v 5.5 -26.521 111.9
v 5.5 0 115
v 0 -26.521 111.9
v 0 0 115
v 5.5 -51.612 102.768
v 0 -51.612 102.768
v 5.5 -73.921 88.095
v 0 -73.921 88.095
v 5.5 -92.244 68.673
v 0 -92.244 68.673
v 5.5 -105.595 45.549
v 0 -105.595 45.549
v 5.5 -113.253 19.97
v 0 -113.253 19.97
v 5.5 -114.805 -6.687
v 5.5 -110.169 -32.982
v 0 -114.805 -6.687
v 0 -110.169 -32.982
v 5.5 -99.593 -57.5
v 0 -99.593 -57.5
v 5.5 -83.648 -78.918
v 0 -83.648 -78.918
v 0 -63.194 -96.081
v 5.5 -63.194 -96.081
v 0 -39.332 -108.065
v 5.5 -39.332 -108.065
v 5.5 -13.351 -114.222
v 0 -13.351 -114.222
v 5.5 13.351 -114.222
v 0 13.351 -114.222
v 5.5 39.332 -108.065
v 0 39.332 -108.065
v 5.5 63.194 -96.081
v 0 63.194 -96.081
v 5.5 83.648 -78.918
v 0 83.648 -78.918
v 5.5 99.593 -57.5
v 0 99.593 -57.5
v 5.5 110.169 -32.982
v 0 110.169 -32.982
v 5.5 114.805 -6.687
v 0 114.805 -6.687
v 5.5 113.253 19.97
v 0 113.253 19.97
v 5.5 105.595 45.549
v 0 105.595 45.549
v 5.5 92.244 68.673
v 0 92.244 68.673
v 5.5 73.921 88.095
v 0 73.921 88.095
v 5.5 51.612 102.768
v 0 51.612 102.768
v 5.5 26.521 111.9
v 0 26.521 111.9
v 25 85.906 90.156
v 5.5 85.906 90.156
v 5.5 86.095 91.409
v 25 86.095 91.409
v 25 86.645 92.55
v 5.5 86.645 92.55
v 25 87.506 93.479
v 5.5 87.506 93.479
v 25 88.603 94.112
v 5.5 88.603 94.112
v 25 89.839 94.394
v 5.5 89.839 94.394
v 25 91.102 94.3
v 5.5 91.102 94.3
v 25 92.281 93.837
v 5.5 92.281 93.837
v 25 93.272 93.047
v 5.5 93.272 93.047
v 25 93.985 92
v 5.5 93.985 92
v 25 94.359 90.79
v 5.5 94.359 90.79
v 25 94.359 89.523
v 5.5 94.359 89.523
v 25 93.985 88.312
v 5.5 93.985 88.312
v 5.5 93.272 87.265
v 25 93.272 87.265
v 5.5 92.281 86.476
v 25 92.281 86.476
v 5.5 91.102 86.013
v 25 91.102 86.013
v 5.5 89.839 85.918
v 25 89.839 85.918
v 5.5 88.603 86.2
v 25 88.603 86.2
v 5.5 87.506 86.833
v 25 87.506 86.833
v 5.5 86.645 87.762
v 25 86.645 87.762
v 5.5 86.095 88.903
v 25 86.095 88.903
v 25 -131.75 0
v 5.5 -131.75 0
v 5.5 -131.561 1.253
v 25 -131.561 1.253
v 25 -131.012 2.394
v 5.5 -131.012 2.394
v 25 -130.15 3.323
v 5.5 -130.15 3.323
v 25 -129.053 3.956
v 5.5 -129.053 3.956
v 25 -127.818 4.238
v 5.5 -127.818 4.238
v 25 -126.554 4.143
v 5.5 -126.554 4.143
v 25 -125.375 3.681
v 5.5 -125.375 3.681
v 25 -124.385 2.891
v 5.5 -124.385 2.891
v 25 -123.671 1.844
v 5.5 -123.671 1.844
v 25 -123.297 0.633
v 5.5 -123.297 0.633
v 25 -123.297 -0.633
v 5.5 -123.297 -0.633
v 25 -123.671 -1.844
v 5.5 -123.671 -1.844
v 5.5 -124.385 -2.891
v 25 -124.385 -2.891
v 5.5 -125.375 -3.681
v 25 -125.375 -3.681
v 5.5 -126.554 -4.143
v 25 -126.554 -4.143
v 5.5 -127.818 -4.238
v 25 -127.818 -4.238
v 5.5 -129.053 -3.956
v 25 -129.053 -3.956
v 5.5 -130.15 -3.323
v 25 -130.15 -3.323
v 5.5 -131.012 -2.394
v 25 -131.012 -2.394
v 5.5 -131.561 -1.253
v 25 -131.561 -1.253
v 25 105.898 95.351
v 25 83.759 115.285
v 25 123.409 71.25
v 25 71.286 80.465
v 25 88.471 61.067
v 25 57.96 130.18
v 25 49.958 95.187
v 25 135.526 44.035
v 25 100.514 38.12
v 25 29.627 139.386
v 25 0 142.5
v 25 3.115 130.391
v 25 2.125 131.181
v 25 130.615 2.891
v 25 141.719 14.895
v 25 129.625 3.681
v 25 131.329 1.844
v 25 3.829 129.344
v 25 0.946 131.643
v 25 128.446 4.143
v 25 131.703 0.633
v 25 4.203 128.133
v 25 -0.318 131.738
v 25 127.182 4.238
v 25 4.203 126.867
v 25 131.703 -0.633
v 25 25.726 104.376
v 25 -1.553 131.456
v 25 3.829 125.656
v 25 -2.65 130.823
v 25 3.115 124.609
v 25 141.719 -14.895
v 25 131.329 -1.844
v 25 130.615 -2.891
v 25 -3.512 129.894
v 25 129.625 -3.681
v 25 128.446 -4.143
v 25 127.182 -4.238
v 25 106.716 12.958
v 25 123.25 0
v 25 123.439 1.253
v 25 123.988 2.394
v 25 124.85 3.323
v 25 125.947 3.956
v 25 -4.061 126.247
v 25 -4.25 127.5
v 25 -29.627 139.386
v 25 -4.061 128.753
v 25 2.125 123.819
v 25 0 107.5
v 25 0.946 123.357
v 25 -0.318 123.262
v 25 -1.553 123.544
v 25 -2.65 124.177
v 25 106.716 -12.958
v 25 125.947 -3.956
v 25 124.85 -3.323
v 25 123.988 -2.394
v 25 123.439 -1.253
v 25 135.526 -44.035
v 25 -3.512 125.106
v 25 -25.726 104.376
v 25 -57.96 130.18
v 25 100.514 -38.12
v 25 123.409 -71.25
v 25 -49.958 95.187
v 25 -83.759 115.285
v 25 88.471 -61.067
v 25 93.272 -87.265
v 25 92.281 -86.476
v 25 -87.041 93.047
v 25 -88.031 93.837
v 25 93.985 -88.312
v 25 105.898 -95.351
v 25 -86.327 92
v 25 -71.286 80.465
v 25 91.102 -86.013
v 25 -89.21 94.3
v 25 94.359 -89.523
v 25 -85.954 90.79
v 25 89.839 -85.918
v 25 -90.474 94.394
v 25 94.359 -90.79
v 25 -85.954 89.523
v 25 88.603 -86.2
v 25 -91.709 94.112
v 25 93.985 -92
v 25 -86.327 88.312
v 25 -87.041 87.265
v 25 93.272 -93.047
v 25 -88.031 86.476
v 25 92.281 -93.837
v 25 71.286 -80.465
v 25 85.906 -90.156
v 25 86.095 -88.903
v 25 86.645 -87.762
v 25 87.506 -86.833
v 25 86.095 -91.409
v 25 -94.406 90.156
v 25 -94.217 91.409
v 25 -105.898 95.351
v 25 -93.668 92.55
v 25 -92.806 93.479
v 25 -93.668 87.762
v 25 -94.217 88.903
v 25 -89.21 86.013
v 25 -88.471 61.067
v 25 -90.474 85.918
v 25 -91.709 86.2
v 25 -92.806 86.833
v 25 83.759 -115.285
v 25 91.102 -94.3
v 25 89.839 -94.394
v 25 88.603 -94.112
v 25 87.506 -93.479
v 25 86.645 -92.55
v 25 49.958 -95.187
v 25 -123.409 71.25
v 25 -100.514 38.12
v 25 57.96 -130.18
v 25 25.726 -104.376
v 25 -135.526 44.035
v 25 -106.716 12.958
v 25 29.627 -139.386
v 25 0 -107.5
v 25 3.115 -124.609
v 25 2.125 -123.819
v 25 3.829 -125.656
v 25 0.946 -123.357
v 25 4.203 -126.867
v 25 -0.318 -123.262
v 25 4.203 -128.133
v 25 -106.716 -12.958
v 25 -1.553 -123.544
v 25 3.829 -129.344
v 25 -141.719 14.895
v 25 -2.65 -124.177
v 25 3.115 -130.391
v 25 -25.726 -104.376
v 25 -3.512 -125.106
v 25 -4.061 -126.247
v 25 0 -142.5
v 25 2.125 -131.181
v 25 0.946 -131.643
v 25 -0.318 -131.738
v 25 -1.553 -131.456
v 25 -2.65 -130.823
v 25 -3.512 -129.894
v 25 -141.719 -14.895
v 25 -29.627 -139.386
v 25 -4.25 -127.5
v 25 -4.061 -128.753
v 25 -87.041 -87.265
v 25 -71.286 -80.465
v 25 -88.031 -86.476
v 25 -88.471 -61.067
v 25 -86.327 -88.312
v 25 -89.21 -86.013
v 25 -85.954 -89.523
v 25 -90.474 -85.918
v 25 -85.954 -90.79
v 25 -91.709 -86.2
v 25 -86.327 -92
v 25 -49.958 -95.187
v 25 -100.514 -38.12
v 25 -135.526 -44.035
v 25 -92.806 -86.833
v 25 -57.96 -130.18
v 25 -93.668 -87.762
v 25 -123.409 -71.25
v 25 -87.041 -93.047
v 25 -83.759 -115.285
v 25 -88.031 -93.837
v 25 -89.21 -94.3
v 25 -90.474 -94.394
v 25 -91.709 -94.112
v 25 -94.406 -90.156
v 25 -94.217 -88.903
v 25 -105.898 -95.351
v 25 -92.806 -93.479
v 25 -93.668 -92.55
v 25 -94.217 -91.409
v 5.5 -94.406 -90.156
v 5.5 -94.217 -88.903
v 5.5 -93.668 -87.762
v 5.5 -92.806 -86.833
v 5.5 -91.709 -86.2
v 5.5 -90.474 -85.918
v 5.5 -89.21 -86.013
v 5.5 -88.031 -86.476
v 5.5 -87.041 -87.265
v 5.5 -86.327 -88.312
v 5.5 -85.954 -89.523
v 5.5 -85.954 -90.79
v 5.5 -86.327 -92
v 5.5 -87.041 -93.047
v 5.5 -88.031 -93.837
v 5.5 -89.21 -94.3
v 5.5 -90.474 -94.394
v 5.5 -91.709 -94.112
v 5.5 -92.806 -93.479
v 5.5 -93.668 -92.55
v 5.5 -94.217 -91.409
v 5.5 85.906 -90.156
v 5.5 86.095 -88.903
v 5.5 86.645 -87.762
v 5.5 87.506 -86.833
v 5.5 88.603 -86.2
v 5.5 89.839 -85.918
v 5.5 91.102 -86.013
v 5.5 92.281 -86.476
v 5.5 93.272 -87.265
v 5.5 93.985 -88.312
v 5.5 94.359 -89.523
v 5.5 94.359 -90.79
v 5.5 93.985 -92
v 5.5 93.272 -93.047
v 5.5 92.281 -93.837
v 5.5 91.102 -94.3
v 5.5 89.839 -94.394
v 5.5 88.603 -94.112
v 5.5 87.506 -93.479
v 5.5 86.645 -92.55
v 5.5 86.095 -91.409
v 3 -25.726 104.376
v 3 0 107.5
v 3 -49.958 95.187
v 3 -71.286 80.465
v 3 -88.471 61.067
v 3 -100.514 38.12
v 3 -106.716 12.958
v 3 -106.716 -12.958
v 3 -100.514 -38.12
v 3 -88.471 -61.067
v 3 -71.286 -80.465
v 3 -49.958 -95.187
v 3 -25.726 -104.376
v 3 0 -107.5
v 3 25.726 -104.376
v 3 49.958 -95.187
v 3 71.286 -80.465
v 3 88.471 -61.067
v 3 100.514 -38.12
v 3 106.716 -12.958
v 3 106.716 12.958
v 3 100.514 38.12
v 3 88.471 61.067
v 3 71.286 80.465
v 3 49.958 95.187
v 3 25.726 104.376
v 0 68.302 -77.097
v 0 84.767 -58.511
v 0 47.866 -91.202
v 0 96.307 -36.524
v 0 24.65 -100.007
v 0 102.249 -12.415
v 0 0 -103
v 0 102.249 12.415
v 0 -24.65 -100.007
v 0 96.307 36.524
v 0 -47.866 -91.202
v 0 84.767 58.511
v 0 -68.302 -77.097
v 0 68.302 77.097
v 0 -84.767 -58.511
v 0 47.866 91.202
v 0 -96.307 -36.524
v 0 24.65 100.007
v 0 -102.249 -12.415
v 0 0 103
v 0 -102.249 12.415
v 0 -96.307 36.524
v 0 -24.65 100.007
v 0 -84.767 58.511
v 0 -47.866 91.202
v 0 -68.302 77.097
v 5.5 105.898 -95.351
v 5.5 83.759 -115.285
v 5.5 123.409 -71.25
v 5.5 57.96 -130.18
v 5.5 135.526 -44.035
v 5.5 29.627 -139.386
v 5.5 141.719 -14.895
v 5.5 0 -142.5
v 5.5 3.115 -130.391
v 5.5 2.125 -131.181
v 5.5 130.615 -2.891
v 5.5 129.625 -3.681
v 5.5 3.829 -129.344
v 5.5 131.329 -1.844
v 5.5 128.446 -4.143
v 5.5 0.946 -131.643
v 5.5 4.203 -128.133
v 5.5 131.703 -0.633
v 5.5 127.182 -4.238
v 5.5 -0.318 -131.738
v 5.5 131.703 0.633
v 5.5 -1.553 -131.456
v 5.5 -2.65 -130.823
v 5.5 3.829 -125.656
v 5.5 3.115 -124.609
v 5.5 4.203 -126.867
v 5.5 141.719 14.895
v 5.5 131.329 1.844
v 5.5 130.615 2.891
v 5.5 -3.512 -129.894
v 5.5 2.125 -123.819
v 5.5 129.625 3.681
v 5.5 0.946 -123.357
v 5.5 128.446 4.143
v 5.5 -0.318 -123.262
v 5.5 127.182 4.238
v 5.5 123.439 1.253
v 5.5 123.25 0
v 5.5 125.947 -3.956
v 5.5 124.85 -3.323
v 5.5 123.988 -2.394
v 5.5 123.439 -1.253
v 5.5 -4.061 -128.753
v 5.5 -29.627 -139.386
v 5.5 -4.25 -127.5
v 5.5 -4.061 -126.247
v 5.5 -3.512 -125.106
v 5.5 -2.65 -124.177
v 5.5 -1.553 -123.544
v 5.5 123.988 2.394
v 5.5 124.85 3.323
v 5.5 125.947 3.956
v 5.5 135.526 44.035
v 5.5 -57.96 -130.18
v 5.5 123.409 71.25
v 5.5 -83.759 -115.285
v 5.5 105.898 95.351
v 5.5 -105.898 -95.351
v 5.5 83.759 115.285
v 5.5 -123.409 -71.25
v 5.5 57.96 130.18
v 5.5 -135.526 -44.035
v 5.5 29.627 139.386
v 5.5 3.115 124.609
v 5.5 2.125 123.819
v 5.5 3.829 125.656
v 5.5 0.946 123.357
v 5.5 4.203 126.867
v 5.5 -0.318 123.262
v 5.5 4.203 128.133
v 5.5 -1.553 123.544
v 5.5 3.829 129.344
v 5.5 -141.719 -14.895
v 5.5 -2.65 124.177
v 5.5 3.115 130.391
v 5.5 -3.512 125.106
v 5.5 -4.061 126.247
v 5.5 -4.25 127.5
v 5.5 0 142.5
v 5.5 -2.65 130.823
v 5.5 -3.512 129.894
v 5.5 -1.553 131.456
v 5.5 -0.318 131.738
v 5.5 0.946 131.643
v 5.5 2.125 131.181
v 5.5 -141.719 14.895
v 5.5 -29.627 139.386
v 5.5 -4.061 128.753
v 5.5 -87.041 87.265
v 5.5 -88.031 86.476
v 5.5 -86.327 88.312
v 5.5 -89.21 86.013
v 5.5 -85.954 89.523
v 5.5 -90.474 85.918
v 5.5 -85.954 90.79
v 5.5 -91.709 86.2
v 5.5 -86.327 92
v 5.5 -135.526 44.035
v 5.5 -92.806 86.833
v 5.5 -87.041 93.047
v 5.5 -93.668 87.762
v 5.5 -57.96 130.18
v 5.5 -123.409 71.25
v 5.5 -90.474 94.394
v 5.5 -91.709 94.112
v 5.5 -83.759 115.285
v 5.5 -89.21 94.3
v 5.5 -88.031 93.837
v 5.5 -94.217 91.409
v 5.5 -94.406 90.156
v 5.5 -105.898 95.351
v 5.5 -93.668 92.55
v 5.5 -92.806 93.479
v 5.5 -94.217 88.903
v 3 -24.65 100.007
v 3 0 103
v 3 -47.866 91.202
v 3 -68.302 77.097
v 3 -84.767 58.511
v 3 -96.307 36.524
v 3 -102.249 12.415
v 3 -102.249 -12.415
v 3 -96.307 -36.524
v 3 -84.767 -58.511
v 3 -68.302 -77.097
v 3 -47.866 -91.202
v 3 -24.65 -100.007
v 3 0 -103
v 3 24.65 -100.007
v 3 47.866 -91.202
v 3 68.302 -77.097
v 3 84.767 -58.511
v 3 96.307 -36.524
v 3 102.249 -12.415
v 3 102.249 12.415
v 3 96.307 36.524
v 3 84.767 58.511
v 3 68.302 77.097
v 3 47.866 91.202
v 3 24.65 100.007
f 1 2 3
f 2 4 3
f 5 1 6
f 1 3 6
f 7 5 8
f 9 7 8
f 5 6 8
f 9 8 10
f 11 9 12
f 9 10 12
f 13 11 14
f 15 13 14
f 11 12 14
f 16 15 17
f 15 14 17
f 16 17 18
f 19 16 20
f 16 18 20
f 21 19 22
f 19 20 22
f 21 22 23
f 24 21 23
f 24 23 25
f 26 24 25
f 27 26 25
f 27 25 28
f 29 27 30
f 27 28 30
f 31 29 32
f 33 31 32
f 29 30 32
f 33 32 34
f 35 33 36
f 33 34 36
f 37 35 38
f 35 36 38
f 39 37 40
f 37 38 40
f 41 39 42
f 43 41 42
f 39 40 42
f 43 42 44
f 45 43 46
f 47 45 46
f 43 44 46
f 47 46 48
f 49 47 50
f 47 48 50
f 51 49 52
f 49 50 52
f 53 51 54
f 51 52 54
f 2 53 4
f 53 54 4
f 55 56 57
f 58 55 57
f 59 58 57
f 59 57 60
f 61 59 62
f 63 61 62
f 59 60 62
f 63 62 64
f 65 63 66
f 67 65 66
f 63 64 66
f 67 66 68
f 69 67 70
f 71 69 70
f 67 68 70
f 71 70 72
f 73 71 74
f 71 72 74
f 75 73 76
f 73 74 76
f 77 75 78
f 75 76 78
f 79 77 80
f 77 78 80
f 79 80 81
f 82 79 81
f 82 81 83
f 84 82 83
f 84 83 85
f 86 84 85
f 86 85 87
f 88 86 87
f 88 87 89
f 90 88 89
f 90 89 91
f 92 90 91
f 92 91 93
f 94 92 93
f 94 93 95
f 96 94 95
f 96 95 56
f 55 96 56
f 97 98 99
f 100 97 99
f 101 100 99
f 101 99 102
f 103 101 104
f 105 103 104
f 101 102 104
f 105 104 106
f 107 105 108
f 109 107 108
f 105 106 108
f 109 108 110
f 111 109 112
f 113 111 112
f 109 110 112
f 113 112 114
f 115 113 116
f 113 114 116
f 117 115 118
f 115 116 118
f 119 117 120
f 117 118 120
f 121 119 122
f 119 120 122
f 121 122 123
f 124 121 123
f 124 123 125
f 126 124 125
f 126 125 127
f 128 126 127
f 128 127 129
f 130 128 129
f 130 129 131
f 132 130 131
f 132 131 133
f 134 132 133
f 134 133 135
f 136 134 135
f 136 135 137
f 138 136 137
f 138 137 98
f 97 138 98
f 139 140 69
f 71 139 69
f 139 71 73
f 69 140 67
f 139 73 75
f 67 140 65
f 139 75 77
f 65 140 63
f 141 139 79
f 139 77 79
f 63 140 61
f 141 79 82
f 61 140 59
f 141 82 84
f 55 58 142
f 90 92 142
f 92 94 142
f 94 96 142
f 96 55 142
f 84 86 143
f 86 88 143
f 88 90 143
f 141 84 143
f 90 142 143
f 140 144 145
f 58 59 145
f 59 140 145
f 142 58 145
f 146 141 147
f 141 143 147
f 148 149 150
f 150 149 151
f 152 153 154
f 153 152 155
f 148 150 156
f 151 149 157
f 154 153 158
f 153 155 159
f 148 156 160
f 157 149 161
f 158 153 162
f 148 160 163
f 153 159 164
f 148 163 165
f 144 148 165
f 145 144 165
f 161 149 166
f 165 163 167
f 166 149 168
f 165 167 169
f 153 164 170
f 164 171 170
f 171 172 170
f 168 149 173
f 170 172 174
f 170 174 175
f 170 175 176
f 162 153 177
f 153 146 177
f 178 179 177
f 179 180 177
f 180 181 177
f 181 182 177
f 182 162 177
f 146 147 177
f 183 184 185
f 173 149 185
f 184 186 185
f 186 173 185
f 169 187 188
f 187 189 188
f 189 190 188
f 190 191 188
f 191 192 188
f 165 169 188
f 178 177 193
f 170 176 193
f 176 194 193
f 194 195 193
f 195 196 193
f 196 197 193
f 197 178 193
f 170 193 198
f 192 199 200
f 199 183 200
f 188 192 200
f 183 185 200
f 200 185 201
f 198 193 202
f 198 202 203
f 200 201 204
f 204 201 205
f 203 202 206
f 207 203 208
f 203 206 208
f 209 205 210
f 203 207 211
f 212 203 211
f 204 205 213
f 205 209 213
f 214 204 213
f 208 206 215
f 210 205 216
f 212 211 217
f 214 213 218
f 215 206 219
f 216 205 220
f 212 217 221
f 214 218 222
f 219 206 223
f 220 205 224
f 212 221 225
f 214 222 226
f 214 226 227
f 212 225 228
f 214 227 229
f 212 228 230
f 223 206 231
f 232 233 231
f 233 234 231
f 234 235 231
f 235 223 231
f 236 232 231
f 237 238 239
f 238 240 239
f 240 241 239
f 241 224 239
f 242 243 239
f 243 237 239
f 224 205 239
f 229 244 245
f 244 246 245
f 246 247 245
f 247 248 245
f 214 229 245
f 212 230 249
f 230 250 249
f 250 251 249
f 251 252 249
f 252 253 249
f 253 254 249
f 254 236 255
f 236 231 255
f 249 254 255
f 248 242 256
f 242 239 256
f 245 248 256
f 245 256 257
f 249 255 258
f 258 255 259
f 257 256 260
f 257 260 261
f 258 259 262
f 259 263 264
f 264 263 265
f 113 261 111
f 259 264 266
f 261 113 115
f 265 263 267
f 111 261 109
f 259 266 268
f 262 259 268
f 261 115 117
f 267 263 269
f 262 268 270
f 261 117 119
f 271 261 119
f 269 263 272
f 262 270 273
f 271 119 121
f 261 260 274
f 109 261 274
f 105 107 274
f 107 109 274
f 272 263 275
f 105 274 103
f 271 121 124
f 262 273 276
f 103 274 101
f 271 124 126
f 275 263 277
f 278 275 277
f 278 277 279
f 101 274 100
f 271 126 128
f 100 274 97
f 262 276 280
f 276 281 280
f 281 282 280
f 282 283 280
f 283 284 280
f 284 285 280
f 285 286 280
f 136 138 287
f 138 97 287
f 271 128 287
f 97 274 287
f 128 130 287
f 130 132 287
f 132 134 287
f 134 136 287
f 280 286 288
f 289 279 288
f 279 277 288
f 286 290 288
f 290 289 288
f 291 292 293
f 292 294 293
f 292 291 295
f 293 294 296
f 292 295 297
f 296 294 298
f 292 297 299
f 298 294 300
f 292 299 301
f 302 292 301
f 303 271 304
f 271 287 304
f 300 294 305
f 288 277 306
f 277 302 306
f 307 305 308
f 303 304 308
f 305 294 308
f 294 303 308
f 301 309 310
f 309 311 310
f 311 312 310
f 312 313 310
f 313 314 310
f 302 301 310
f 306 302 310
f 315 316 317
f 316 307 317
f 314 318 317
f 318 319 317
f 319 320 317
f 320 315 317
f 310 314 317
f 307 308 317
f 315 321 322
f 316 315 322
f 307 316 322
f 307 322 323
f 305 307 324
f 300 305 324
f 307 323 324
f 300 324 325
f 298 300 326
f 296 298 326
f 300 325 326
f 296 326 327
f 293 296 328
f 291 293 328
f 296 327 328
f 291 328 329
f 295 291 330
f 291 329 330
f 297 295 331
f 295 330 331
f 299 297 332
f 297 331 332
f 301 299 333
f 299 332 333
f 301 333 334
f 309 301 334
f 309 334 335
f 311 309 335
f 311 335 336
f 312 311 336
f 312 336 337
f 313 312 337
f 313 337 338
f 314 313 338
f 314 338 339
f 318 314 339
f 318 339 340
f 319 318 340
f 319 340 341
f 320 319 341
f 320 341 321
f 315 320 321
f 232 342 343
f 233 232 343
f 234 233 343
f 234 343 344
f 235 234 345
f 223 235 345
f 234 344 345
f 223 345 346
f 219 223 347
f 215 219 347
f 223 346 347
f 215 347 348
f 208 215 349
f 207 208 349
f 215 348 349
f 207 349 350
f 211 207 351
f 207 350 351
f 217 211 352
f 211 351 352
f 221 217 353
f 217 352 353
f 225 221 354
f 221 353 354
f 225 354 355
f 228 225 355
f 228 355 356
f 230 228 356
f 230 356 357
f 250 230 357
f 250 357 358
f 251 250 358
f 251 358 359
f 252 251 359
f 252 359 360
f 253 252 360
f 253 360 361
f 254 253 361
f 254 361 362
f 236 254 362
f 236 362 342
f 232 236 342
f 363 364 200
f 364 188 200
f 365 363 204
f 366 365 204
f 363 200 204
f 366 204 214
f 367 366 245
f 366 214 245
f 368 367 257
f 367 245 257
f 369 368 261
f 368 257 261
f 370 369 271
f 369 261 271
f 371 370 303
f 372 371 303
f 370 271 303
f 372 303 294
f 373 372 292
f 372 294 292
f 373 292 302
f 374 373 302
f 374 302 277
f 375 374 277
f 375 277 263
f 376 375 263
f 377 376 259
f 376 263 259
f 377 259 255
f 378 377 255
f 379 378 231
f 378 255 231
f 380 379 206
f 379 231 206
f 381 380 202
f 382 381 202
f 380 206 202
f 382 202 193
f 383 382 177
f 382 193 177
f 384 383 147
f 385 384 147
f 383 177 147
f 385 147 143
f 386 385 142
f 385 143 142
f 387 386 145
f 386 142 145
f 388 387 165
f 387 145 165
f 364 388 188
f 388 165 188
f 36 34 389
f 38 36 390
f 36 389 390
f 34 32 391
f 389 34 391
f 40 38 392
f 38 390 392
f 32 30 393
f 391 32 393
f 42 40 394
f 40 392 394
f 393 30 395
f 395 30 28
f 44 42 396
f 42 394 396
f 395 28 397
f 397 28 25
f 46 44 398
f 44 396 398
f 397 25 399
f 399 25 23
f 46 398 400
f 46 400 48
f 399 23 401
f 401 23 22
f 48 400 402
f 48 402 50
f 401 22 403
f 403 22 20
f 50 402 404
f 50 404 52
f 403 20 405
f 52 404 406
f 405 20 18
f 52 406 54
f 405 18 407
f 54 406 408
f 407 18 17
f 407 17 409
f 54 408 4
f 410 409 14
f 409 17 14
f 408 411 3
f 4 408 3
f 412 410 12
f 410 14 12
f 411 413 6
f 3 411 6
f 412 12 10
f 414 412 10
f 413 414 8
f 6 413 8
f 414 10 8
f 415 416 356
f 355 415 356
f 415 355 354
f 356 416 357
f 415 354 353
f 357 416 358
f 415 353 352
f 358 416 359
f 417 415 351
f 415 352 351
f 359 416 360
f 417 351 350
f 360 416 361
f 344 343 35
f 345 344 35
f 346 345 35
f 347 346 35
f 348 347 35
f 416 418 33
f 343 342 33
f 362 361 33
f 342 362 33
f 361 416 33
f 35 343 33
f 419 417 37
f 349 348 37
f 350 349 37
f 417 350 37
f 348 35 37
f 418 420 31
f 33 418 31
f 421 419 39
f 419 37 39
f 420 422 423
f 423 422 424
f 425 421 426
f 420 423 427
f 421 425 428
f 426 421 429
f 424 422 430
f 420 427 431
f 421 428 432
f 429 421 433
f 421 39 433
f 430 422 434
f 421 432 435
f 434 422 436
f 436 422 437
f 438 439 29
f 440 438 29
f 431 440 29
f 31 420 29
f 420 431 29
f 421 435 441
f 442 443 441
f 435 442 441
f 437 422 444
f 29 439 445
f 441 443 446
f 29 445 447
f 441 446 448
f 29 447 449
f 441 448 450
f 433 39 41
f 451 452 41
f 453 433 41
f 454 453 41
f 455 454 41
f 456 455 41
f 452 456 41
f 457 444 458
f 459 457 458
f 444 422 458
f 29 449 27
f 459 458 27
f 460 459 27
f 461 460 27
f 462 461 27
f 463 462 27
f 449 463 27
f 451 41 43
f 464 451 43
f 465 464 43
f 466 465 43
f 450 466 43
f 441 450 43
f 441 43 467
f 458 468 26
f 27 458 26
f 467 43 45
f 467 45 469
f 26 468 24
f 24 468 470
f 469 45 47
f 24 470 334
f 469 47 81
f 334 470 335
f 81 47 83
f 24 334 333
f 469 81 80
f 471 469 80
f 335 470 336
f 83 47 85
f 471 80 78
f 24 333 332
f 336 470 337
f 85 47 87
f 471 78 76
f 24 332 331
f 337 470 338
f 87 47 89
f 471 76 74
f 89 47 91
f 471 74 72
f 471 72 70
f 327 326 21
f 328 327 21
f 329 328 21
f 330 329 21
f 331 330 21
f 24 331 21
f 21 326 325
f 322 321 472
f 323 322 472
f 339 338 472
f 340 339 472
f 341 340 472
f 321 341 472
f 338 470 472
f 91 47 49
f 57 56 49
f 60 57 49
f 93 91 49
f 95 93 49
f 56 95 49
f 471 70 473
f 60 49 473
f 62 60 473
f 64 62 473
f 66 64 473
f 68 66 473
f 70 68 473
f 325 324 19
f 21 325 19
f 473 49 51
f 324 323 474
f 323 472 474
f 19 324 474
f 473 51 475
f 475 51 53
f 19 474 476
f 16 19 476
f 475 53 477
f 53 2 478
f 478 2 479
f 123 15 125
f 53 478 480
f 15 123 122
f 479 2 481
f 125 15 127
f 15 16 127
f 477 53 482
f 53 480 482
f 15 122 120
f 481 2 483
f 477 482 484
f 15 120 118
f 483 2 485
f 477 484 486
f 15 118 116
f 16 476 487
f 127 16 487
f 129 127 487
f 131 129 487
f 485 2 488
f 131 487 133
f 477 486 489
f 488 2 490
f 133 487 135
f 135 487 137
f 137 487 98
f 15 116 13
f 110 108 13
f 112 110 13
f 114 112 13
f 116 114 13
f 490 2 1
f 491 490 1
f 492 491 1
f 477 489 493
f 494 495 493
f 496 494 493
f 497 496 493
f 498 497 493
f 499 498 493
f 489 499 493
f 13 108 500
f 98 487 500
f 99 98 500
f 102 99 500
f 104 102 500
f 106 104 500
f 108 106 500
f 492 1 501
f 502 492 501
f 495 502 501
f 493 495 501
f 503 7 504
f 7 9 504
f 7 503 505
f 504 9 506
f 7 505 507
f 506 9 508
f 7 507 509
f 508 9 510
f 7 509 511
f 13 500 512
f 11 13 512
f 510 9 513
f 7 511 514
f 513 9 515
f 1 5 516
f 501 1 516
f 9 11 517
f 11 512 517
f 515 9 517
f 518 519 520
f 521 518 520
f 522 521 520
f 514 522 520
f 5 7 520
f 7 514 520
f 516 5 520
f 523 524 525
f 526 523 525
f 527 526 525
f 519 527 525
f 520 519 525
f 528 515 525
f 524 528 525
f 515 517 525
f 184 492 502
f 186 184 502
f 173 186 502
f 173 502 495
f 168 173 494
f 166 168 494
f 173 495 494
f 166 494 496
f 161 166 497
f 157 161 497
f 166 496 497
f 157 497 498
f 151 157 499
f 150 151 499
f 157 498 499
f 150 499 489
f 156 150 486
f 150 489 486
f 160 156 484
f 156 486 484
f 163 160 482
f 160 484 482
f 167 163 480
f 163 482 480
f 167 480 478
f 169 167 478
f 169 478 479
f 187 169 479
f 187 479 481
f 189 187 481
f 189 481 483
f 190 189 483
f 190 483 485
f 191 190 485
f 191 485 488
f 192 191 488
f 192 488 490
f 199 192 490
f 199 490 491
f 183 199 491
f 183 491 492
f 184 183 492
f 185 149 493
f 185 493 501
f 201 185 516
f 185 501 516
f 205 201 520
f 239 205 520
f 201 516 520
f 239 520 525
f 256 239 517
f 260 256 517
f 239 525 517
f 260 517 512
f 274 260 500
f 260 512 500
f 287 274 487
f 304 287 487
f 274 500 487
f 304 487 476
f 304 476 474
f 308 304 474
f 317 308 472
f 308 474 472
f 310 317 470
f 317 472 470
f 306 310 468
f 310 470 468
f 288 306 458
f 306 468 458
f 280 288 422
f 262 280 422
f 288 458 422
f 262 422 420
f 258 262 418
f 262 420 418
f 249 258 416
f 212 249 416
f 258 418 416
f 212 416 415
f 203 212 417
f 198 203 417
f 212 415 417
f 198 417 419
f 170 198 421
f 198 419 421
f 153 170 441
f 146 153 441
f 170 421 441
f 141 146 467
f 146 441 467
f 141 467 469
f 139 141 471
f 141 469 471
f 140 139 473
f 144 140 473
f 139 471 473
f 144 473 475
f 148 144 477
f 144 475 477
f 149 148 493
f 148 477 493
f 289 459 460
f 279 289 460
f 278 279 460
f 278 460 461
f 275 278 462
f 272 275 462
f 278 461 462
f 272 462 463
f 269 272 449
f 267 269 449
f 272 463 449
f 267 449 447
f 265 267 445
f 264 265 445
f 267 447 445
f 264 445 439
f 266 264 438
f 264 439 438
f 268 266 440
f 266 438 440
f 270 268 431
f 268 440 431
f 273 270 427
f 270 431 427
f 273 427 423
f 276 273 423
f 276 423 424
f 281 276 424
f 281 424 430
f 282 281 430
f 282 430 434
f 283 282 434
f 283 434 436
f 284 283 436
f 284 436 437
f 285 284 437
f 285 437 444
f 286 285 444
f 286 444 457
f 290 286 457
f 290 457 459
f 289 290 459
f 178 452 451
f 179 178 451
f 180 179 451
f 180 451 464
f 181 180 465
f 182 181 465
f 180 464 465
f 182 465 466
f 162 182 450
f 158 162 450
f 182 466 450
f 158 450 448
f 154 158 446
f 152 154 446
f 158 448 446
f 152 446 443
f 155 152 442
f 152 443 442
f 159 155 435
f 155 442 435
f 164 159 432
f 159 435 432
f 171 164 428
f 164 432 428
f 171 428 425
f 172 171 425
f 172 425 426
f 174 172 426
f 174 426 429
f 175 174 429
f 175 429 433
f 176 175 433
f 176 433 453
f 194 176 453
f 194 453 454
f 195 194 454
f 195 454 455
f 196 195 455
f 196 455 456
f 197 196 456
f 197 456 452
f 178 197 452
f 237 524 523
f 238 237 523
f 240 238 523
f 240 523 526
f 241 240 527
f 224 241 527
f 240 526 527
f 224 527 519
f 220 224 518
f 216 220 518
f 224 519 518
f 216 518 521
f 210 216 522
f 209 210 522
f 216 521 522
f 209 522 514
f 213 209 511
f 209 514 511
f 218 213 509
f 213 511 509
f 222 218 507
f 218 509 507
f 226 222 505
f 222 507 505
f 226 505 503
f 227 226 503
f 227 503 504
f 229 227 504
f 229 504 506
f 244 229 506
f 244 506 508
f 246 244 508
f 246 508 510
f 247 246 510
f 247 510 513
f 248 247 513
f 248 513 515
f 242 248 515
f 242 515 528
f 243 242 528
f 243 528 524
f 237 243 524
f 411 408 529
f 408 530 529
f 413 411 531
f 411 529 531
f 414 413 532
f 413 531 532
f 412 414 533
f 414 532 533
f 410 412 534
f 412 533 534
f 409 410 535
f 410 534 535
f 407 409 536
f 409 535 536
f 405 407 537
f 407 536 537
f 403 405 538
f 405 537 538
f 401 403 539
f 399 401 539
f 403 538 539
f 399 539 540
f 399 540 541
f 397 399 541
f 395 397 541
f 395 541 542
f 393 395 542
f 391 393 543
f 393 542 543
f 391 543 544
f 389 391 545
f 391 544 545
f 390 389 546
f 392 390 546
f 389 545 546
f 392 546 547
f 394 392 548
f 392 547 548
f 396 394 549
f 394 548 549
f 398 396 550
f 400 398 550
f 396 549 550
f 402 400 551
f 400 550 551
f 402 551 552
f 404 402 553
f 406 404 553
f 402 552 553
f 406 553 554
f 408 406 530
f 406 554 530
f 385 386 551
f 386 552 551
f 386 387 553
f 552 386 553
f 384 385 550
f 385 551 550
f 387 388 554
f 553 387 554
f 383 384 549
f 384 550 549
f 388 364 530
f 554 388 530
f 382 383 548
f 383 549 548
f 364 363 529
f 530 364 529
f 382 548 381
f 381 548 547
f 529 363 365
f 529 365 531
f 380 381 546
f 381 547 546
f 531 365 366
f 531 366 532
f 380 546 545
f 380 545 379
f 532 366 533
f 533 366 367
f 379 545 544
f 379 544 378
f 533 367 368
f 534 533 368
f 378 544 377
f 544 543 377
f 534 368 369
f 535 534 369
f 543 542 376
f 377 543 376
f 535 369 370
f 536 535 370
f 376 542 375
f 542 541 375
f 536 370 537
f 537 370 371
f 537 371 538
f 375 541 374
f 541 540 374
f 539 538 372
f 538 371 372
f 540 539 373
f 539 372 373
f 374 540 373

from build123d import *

# Parameters (mm, degrees)
F3_D     = 8.5
F3_DEPTH = 49.5
F3_TIP   = 2.5536576309


with BuildPart() as f1:
    # F0 (on Front) → F1 (revolve)
    with BuildSketch(Plane.XZ):
        Polygon((5.5, 115), (0, 115), (0, 107.5), (0, 103), (3, 103), (3, 107.5), (25, 107.5), (25, 142.5), (5.5, 142.5), align=None)
    revolve(axis=Axis((120.2051416039, 0, 0), (1, 0, 0)))

    # F3
    with Locations(Plane.YZ.offset(25)):
        with Locations((0, 127.5), (90.1561146013, 90.1561146013), (127.5, 0), (90.1561146013, -90.1561146013), (0, -127.5), (-90.1561146013, -90.1561146013), (-127.5, 0), (-90.1561146013, 90.1561146013)):
            Hole(F3_D / 2, depth=F3_DEPTH)
            with Locations((0, 0, -(F3_DEPTH + F3_TIP / 2))):  # 118° drill point
                Cone(0, F3_D / 2, F3_TIP, mode=Mode.SUBTRACT)


solid = f1.part
